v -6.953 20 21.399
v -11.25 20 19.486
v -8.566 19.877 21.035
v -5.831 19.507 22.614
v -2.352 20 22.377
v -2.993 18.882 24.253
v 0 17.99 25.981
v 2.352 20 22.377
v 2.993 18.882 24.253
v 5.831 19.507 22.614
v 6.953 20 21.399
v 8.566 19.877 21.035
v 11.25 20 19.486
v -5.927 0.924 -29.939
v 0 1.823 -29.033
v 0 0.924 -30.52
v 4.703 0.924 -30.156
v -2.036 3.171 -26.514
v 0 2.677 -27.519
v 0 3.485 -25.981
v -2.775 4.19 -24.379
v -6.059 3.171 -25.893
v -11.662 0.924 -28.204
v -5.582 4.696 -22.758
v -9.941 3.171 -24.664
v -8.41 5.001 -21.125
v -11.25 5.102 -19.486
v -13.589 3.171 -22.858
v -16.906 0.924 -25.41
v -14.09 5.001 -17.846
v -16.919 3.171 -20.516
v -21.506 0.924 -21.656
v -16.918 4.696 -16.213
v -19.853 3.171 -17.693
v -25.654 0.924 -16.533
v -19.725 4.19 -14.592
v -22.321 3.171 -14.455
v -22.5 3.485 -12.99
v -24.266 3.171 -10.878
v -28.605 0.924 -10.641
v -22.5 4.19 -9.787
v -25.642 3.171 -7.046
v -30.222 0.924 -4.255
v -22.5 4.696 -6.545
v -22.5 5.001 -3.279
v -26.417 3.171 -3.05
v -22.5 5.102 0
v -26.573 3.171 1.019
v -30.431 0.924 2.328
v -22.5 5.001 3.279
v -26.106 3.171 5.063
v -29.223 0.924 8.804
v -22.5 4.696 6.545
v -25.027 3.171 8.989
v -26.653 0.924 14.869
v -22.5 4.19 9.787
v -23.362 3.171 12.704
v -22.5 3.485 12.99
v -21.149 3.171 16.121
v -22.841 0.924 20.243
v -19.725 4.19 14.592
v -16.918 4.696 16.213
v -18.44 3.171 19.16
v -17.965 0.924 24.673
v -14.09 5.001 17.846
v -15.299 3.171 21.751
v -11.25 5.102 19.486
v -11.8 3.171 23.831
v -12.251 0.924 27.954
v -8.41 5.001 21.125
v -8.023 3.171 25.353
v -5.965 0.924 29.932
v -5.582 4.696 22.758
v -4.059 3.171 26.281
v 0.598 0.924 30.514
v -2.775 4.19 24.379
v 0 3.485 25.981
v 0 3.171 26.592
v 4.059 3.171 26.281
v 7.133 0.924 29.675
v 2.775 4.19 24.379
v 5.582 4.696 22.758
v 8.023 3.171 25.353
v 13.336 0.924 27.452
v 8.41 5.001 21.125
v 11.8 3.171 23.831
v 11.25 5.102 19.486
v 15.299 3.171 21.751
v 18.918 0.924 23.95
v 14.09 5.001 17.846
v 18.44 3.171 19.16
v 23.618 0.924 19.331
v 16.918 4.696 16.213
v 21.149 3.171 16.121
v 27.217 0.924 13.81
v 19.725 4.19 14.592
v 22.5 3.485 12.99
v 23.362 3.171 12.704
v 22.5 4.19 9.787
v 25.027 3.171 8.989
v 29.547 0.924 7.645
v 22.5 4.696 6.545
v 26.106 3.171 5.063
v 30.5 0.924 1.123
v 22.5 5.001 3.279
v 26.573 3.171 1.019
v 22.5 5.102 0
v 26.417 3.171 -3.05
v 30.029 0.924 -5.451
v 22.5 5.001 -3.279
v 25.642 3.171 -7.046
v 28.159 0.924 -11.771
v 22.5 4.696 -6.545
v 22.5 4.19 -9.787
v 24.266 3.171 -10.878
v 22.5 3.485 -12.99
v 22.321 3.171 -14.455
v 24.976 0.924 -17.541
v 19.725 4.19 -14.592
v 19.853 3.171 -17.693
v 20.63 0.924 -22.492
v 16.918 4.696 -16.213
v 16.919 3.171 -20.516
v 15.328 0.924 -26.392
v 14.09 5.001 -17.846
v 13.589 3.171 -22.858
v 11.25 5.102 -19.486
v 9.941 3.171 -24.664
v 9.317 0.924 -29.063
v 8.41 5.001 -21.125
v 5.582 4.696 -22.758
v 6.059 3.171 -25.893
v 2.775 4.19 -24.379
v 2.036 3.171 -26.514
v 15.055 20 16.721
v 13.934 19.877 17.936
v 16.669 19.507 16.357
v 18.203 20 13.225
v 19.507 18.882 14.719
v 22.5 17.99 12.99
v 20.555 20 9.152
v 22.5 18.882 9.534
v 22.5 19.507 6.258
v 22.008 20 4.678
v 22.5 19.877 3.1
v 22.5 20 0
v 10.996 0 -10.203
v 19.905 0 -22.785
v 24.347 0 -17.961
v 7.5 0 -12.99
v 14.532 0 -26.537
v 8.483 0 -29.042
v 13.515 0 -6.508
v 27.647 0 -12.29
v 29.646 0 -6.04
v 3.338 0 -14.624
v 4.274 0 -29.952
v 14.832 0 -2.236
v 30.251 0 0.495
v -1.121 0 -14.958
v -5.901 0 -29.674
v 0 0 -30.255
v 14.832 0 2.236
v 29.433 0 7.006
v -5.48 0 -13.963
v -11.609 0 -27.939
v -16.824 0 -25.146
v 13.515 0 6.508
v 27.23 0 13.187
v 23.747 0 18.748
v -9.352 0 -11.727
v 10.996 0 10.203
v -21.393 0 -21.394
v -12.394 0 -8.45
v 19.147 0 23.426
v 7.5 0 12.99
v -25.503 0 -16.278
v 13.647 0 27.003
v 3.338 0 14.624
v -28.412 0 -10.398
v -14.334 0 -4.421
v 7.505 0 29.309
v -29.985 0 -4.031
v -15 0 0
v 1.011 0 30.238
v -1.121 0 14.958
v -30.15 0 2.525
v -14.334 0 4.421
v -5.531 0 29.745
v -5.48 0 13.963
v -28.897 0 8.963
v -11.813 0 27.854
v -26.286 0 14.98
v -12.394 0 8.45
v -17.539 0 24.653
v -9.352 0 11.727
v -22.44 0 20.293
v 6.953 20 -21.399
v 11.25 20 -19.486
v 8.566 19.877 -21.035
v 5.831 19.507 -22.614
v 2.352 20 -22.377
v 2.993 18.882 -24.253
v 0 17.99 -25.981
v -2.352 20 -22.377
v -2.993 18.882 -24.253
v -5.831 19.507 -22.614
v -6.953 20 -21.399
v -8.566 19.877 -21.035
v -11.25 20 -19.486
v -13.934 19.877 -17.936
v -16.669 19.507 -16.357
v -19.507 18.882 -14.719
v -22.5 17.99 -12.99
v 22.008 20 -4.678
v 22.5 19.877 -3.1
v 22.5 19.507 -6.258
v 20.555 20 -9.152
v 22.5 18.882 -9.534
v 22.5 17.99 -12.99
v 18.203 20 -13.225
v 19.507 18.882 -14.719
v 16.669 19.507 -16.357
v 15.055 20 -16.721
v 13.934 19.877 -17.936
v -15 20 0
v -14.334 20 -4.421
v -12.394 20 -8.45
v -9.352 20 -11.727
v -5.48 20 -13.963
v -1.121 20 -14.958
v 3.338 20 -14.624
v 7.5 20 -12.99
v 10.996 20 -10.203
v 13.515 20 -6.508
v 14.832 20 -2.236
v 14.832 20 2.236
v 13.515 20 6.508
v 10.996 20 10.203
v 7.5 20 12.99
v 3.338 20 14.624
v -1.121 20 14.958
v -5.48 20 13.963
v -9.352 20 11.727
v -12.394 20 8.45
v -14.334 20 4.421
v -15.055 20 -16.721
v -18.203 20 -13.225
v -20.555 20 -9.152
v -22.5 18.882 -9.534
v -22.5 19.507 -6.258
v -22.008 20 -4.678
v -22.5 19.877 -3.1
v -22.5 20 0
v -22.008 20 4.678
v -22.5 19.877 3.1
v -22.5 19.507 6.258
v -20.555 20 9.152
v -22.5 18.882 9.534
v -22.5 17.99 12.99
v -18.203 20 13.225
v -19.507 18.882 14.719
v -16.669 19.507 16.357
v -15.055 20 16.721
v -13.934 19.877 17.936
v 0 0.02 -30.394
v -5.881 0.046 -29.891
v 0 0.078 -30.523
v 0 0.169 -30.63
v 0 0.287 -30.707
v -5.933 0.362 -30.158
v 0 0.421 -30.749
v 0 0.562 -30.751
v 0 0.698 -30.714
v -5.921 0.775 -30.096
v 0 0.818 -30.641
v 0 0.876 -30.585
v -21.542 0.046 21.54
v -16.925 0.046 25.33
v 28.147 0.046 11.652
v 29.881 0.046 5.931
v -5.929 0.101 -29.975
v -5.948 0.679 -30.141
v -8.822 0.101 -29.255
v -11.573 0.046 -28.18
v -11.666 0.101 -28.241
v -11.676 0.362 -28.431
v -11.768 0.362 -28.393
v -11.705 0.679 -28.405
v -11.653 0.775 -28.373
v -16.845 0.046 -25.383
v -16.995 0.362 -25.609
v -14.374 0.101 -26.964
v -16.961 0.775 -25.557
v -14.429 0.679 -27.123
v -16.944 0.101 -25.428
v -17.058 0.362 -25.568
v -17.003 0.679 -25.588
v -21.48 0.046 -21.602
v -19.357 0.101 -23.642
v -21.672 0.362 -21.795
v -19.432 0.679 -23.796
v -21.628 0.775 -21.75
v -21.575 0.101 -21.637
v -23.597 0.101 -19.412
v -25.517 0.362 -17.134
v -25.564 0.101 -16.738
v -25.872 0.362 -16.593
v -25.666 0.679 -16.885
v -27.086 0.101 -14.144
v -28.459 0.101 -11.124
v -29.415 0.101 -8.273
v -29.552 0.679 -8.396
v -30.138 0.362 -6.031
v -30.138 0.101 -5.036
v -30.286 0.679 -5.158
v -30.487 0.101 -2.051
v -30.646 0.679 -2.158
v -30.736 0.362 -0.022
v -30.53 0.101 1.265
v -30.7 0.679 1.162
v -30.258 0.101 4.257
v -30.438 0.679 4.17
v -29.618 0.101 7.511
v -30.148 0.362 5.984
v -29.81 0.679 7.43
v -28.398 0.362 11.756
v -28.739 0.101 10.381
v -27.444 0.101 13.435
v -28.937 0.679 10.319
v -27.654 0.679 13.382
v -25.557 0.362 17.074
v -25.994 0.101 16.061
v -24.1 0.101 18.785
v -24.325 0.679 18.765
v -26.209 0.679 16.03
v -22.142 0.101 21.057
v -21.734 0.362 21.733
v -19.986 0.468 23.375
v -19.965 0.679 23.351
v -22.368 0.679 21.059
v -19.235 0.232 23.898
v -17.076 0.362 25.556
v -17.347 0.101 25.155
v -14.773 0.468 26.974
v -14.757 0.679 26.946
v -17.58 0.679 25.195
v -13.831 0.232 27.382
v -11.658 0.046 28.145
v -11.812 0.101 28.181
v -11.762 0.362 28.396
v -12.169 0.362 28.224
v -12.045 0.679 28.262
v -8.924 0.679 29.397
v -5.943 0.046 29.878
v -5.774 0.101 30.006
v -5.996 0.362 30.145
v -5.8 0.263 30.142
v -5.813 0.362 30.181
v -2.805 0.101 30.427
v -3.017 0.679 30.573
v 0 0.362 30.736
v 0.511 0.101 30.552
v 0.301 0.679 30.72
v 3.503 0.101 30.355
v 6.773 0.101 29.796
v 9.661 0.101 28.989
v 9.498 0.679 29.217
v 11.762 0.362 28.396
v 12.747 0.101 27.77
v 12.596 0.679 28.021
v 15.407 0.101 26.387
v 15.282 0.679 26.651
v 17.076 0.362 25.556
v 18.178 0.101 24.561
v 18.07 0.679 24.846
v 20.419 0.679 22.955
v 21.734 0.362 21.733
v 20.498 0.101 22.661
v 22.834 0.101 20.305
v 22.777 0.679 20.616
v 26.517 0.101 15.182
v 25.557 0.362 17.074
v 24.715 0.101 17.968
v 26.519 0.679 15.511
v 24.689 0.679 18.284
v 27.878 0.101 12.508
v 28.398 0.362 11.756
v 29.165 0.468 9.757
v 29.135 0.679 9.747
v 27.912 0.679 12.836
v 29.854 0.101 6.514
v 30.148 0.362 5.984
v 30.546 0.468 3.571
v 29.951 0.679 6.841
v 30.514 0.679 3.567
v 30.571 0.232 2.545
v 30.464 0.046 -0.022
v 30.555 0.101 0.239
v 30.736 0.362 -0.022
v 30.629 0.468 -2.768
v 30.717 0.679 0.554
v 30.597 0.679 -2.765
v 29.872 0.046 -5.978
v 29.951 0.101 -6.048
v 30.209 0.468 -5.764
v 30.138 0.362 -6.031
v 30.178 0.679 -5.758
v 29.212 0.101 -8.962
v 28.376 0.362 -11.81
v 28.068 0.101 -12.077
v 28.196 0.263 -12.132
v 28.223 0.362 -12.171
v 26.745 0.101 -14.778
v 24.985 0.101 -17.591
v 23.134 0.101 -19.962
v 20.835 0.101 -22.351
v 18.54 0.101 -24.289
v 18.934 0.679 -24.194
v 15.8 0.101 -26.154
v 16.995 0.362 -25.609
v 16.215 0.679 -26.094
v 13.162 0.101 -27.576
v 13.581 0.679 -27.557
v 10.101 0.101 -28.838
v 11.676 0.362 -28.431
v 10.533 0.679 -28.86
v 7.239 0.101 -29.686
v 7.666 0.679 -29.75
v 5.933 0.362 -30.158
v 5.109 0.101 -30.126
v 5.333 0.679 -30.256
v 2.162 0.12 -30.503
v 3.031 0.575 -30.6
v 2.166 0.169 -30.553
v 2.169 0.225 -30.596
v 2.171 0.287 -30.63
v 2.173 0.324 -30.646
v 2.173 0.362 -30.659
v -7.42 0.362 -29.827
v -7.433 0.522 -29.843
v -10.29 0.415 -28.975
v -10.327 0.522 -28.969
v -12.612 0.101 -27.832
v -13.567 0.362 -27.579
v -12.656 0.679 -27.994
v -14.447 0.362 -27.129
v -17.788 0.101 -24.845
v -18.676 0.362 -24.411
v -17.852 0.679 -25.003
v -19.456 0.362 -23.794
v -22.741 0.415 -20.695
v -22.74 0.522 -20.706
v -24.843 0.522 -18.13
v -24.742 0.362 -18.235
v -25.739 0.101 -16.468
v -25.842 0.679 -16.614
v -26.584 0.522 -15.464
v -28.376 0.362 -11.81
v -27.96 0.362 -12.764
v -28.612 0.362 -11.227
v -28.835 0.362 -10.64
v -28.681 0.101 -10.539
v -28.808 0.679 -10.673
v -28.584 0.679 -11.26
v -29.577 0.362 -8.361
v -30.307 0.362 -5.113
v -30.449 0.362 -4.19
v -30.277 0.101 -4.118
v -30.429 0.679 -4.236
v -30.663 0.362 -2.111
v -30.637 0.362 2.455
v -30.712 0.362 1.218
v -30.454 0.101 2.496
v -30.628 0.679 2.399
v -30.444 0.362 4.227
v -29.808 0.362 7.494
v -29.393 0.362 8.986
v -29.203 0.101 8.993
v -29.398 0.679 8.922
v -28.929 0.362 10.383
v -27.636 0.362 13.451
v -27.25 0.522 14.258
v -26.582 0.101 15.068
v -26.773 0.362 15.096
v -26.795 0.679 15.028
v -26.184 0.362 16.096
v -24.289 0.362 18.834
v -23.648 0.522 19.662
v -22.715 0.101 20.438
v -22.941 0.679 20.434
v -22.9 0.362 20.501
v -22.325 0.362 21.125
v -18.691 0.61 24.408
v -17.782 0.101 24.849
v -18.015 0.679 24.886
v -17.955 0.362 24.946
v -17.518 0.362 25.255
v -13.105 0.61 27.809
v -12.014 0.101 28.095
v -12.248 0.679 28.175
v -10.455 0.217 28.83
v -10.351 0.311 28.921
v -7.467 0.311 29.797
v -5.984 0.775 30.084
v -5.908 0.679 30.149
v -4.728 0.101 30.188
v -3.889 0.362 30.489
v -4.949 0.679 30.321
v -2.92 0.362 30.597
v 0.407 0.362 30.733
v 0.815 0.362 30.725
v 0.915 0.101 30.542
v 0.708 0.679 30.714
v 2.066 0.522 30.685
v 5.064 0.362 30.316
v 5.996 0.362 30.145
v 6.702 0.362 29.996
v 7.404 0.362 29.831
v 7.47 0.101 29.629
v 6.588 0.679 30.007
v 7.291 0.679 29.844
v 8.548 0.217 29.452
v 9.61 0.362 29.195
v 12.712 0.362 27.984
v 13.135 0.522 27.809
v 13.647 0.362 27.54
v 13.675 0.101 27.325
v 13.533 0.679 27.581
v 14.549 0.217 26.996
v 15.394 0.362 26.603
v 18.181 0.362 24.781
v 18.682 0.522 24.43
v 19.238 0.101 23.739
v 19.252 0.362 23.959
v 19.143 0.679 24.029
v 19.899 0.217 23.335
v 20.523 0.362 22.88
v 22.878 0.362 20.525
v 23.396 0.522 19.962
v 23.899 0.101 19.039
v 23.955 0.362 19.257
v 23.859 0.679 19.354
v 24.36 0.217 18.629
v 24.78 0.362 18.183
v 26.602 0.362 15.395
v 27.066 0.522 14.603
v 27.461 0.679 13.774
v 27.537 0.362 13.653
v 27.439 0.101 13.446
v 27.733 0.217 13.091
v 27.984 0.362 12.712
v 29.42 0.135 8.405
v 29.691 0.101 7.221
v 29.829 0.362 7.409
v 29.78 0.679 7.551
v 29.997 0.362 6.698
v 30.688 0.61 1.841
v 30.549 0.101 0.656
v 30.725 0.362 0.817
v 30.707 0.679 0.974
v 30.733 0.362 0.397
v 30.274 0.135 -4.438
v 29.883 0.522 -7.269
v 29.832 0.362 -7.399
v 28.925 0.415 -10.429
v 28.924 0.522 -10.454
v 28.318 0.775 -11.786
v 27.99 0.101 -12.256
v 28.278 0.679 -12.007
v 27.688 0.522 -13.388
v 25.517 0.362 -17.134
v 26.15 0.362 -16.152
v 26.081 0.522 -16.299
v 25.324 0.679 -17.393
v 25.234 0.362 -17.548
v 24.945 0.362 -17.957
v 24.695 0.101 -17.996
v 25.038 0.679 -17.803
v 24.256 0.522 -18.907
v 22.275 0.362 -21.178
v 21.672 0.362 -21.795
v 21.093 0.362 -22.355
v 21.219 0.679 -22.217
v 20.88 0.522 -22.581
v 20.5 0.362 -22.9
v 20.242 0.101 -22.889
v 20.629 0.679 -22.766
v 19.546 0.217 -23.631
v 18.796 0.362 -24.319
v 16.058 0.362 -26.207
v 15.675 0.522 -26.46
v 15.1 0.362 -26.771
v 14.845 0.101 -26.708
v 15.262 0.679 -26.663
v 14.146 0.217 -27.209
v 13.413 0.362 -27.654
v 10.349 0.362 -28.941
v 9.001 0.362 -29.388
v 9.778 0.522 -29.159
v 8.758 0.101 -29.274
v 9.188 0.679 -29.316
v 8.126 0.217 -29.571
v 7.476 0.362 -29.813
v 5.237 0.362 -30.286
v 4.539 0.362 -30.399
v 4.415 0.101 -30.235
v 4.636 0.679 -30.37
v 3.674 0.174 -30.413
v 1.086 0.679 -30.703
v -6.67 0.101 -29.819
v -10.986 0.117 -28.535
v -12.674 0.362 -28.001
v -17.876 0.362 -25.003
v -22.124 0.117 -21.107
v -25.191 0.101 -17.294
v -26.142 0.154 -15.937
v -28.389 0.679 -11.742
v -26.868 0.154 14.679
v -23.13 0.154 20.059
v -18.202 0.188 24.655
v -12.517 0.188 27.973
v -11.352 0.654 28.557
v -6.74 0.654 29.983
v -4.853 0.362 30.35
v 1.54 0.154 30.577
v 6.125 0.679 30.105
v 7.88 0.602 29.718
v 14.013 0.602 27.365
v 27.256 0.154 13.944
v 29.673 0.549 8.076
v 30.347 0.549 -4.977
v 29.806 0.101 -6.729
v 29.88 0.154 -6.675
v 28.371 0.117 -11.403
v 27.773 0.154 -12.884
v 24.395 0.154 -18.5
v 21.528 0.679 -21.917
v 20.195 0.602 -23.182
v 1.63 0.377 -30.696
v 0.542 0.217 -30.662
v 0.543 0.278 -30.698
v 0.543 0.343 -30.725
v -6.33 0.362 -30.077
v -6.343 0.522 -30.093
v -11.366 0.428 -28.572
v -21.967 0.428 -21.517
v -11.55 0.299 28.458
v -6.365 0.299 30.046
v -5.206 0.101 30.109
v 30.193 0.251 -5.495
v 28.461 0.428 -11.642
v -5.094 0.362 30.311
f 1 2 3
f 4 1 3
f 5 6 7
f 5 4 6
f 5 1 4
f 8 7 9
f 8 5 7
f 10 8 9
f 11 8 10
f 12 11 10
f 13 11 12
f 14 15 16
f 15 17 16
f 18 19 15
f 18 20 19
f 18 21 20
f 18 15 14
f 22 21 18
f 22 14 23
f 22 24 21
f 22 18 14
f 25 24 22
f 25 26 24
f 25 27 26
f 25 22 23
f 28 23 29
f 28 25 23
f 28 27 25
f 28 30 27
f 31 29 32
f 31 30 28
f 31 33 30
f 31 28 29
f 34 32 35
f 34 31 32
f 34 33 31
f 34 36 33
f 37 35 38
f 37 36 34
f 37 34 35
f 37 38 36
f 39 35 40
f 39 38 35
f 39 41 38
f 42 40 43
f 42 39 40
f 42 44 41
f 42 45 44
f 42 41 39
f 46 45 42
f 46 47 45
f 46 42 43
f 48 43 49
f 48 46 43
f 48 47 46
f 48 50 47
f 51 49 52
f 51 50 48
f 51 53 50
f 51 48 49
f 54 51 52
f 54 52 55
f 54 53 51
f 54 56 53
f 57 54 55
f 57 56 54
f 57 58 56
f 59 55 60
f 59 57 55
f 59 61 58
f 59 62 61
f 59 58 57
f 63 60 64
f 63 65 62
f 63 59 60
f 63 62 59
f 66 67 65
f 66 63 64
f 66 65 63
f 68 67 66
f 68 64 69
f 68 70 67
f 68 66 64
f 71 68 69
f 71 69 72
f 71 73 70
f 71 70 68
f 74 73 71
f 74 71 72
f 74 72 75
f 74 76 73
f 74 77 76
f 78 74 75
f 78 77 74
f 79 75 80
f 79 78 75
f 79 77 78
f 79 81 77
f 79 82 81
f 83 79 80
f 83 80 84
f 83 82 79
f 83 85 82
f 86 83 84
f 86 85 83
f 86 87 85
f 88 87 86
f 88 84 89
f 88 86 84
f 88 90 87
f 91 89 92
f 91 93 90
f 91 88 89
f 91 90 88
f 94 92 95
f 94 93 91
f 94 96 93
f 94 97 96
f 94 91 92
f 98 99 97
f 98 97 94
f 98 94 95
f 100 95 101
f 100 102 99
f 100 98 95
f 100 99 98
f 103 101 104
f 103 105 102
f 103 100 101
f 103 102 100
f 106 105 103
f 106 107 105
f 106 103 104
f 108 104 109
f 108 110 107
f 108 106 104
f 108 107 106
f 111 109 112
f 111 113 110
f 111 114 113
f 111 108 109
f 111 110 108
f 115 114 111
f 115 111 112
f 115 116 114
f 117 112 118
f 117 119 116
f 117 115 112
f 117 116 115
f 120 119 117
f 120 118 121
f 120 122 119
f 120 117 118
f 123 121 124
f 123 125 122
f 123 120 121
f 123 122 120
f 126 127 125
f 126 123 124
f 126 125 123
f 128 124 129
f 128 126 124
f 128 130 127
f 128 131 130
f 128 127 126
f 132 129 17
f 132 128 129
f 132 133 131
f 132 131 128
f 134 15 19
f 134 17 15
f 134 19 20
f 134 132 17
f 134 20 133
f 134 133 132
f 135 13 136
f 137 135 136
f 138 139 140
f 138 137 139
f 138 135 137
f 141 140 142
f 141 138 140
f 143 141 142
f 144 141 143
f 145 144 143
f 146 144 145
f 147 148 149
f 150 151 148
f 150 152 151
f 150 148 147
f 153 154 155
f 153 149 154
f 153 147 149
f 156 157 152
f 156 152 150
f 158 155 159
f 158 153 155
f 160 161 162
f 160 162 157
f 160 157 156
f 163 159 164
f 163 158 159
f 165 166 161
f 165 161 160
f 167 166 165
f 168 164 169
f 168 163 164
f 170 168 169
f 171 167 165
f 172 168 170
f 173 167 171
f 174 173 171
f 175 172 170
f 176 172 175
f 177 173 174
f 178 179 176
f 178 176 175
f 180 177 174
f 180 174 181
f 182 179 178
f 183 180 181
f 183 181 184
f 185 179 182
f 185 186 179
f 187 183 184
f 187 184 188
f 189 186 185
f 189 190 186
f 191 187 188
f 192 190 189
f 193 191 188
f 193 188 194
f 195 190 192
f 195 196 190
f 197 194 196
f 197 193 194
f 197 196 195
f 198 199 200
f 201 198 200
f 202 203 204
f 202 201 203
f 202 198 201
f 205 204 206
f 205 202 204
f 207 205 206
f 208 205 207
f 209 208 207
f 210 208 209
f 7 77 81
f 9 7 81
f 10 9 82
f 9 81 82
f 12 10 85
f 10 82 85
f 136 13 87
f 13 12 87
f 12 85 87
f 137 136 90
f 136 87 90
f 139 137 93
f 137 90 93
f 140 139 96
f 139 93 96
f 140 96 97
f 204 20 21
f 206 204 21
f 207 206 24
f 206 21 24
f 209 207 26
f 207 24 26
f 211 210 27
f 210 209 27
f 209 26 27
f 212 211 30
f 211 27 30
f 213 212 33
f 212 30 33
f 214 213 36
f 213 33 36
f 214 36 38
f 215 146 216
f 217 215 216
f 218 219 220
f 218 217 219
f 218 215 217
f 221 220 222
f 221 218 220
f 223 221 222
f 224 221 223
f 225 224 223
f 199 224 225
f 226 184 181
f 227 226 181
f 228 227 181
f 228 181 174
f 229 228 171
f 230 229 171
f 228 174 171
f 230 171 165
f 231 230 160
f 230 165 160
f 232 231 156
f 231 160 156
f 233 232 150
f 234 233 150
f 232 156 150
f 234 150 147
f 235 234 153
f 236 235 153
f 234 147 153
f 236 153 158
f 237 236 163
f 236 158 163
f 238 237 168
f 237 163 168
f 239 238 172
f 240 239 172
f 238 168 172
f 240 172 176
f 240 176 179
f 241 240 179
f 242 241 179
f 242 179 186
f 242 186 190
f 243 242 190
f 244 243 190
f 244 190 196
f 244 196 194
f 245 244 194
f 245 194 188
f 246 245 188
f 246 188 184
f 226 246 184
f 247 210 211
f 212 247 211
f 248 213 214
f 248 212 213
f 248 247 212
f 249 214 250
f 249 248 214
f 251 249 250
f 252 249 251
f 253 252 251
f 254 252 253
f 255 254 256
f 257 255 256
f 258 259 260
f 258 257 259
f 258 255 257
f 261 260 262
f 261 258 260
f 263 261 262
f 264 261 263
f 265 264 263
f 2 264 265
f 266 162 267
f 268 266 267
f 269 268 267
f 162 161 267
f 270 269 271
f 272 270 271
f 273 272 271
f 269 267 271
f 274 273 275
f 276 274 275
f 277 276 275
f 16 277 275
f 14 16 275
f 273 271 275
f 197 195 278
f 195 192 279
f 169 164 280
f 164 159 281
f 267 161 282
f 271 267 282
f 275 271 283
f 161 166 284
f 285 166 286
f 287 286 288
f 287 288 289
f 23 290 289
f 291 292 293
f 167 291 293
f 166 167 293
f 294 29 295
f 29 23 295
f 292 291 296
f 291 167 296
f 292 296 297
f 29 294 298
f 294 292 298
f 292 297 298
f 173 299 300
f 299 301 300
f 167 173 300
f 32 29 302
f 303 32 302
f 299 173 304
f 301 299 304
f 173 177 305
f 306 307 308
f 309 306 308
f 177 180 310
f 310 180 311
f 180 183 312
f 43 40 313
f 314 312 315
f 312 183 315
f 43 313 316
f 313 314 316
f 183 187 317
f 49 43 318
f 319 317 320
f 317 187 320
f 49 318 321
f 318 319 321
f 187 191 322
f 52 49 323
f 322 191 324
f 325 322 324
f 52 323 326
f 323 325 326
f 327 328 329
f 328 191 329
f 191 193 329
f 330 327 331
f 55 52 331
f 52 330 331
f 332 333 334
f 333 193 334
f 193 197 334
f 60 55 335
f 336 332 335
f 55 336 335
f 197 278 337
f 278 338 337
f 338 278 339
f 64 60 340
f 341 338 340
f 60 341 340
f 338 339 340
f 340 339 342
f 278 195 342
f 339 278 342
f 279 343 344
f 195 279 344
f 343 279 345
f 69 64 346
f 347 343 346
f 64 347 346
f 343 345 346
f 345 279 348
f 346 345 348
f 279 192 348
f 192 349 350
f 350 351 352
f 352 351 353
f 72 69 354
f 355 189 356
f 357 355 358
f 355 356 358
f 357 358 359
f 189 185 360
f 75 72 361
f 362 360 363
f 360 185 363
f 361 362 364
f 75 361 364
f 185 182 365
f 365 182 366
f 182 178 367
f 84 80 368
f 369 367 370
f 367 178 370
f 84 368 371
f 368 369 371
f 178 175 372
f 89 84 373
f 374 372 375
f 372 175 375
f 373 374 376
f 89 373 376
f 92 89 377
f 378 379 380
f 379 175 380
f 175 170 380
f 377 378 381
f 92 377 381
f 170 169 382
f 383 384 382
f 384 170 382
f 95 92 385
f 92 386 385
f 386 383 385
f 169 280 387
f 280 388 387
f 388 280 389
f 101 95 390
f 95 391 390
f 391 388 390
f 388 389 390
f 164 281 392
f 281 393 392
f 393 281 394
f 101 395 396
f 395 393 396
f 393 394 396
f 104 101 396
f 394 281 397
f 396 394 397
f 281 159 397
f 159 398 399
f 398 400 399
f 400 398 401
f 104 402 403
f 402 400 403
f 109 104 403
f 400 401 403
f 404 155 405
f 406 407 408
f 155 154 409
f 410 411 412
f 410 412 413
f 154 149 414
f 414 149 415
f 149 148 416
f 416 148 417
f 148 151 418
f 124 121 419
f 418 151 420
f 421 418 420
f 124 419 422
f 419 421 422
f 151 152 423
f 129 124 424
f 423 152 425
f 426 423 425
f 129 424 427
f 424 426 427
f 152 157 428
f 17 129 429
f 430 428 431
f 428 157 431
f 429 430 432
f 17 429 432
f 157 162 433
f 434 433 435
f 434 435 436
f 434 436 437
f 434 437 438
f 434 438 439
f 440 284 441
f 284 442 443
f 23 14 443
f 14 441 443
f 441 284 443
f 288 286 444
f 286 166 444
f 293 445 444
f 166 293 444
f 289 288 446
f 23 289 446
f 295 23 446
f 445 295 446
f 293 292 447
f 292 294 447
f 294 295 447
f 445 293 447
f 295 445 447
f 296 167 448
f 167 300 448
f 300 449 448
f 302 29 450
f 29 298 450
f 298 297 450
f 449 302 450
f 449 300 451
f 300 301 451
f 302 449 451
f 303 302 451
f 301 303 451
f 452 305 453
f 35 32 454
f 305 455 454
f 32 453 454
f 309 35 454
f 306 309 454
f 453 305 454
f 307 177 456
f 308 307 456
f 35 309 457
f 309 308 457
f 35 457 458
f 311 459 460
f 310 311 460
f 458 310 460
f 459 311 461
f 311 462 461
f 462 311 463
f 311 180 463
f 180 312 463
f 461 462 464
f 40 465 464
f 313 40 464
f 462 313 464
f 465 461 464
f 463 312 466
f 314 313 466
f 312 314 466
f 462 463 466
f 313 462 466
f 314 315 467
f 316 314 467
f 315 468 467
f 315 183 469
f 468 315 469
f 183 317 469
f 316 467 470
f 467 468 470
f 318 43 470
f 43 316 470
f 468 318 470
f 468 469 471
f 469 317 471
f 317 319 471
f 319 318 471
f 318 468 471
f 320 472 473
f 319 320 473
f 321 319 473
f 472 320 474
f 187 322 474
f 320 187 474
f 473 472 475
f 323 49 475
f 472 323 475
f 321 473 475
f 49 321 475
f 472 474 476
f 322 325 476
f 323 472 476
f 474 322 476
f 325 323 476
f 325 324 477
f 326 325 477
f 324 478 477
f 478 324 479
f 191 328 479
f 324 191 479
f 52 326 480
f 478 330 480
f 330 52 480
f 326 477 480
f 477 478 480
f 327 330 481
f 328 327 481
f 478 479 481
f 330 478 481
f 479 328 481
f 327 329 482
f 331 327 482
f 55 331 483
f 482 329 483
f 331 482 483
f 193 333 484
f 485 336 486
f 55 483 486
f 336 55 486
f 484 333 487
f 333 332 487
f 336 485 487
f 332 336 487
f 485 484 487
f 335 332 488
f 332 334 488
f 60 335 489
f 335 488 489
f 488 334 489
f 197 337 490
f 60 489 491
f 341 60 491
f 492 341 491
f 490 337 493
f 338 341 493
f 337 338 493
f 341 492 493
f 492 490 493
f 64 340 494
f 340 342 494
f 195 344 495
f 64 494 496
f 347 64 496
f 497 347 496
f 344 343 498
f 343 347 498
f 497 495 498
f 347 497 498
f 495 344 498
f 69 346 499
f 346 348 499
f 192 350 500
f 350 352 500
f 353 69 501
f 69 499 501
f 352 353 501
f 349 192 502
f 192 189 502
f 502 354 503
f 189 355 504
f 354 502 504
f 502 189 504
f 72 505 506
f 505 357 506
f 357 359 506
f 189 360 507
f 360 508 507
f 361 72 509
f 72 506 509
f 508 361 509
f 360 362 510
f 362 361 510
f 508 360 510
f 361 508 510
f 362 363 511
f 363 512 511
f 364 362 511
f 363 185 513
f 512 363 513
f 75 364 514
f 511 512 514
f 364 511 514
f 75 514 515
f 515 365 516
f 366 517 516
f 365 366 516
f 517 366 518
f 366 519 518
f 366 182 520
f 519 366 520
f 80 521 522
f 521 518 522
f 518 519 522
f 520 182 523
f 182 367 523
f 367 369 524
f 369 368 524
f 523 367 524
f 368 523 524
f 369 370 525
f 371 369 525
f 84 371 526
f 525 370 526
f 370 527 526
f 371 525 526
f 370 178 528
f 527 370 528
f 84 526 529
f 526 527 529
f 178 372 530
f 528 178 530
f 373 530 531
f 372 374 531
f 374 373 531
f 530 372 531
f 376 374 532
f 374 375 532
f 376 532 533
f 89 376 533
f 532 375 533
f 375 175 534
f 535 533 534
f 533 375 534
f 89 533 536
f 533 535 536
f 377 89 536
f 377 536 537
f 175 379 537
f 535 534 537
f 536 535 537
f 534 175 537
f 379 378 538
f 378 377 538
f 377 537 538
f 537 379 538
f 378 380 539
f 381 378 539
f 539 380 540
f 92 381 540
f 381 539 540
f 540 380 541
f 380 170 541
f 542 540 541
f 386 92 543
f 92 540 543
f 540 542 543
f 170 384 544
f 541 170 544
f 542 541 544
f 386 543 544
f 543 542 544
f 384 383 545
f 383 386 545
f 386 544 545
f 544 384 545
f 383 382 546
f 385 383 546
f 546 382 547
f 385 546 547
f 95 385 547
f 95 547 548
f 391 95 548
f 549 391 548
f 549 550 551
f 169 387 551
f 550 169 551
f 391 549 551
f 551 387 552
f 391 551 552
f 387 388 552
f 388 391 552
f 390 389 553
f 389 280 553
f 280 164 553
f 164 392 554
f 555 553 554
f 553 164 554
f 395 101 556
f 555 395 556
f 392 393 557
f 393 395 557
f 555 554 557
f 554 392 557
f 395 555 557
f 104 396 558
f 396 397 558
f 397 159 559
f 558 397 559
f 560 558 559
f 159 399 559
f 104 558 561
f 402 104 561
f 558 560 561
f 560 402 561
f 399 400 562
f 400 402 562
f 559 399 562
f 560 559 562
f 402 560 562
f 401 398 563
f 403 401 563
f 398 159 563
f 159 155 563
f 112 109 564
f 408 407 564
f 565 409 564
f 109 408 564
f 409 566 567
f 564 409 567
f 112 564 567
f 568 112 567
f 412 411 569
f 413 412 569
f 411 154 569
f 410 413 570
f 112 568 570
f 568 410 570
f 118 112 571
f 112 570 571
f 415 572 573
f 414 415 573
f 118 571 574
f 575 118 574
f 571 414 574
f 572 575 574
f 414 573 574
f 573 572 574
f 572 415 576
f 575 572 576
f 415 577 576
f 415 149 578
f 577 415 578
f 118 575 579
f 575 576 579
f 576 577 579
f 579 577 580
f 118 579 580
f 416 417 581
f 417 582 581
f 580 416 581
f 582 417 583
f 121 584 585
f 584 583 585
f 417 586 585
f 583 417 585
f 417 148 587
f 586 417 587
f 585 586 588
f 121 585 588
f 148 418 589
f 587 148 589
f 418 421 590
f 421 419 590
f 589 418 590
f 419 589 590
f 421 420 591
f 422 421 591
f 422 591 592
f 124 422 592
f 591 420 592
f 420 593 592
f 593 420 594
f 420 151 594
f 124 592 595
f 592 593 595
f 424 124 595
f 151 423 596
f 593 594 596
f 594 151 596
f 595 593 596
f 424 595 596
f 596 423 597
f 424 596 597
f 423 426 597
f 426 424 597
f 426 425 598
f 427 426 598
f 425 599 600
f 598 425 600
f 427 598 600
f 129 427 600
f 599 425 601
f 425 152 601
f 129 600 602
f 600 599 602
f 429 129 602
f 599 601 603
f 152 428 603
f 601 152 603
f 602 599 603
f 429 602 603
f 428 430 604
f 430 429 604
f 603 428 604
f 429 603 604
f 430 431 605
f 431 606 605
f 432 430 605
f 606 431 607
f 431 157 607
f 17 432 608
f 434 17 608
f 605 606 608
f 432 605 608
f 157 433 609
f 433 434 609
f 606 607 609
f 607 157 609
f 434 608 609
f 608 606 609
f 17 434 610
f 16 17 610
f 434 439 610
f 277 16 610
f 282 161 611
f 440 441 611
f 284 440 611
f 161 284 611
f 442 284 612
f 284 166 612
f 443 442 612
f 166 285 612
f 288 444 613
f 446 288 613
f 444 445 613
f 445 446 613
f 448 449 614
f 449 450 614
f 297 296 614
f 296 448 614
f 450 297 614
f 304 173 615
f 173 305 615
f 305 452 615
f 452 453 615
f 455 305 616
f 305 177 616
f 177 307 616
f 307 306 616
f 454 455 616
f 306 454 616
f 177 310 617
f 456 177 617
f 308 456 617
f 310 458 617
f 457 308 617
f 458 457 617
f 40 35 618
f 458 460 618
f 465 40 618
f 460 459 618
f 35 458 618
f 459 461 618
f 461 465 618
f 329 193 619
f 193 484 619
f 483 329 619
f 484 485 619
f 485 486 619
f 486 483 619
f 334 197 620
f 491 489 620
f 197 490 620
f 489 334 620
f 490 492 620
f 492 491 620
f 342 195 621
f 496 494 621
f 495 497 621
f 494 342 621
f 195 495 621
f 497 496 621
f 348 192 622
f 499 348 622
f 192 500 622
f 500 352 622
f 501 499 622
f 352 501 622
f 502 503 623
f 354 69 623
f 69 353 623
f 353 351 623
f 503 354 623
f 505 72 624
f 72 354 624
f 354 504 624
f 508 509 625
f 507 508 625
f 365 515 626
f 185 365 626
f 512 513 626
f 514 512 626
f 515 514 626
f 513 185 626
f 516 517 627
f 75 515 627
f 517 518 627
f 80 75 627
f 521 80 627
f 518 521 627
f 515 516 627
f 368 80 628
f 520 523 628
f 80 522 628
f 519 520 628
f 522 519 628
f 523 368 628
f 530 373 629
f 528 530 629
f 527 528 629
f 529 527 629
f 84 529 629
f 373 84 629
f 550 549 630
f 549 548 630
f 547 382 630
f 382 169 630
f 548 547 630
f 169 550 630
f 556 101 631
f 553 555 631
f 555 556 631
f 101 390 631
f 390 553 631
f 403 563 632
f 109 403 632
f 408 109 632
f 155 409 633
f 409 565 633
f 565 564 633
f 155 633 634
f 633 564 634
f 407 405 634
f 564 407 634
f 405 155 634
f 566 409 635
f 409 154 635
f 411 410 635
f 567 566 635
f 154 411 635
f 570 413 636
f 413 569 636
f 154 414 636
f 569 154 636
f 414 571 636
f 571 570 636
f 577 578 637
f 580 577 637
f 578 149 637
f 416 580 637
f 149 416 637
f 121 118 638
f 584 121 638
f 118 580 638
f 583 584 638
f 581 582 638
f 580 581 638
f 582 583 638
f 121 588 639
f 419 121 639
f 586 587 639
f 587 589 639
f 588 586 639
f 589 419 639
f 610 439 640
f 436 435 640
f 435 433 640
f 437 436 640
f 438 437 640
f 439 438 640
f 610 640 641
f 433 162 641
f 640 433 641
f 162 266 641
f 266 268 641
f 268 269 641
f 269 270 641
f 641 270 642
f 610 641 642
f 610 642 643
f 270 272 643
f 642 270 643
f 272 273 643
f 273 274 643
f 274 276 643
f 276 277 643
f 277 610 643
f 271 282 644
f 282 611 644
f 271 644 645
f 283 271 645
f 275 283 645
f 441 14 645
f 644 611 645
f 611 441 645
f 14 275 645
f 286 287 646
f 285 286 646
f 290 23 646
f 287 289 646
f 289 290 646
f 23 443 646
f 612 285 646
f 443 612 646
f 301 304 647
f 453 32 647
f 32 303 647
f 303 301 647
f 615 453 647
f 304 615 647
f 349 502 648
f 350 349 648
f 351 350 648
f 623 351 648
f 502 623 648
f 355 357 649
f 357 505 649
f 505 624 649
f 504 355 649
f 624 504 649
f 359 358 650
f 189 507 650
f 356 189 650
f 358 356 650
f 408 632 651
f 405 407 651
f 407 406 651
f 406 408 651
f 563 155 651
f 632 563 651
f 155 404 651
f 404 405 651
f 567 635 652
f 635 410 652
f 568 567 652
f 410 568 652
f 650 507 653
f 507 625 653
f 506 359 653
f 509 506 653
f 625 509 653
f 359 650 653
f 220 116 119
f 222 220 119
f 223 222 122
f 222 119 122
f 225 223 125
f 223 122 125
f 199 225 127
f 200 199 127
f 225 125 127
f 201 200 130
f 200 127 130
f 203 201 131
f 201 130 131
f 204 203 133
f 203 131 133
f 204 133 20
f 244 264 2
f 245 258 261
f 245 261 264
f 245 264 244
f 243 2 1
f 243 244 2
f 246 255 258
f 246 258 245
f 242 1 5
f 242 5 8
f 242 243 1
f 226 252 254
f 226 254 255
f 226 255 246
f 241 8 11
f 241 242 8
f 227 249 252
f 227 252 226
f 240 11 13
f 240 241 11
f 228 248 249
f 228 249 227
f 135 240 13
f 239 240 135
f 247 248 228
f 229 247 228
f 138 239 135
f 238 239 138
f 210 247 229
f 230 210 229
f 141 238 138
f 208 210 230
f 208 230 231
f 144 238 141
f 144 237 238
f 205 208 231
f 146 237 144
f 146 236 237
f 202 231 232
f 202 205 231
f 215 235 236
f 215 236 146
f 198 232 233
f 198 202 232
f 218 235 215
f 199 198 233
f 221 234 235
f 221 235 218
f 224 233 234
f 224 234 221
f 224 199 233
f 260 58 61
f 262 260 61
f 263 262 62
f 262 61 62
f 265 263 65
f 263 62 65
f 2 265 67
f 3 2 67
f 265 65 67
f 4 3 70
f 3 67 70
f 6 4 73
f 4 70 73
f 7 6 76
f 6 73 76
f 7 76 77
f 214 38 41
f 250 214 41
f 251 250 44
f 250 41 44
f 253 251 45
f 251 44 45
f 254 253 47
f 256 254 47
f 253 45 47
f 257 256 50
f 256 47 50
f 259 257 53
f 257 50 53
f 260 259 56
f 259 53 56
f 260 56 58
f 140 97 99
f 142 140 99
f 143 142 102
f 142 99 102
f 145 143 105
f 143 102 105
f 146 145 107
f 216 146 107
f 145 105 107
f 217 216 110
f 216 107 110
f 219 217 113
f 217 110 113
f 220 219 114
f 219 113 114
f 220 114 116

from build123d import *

# Parameters (mm, degrees)
BOSS_EXTRUDE1_DEPTH       = 20
FILLET1_R                 = 0.5
F_1_5MM_DOWEL_HOLE1_D     = 30
F_1_5MM_DOWEL_HOLE1_DEPTH = 20


with BuildPart() as part:
    # Sketch1 → Boss-Extrude1 (new body)
    with BuildSketch(Plane(origin=(0, 0, 0), x_dir=(1, 0, 0), z_dir=(0, 1, 0))):
        Polygon((0, 25.980762114), (-22.5, 12.990381057), (-22.5, -12.990381057), (0, -25.980762114), (22.5, -12.990381057), (22.5, 12.990381057), align=None)
    extrude(amount=BOSS_EXTRUDE1_DEPTH)

    # Sketch3 → Revolve1 (revolve)
    with BuildSketch(Plane(origin=(0, 0, 0), x_dir=(0, 0, -1), z_dir=(1, 0, 0))):
        with BuildLine():
            Line((0, 9.682153322), (0, 0))
            Line((0, 0), (31.95, 0))
            ThreePointArc((31.95, 0), (16.692412894, 7.208457265), (0, 9.682153322))
        make_face()
    revolve(axis=Axis((0, 0, 0), (0, 1, 0)))

    # Fillet1
    fillet1_edges = [part.edges().sort_by_distance(p)[0] for p in [
        (0, 0, 31.95),
    ]]
    fillet(fillet1_edges, radius=FILLET1_R)

    # Ø1.5mm Dowel Hole1
    with Locations(Plane(origin=(0, 20, 0), x_dir=(1, 0, 0), z_dir=(0, 1, 0))):
        with Locations((0, 0)):
            Hole(F_1_5MM_DOWEL_HOLE1_D / 2, depth=F_1_5MM_DOWEL_HOLE1_DEPTH)

    # Sketch6 → Cut-Revolve1 (revolve, cut)
    with BuildSketch(Plane.XY):
        Polygon((22.5, 20), (28.5, 20), (28.5, 16.535898385), align=None)
    revolve(axis=Axis((0, 0, 0), (0, 1, 0)), mode=Mode.SUBTRACT)


solid = part.part
